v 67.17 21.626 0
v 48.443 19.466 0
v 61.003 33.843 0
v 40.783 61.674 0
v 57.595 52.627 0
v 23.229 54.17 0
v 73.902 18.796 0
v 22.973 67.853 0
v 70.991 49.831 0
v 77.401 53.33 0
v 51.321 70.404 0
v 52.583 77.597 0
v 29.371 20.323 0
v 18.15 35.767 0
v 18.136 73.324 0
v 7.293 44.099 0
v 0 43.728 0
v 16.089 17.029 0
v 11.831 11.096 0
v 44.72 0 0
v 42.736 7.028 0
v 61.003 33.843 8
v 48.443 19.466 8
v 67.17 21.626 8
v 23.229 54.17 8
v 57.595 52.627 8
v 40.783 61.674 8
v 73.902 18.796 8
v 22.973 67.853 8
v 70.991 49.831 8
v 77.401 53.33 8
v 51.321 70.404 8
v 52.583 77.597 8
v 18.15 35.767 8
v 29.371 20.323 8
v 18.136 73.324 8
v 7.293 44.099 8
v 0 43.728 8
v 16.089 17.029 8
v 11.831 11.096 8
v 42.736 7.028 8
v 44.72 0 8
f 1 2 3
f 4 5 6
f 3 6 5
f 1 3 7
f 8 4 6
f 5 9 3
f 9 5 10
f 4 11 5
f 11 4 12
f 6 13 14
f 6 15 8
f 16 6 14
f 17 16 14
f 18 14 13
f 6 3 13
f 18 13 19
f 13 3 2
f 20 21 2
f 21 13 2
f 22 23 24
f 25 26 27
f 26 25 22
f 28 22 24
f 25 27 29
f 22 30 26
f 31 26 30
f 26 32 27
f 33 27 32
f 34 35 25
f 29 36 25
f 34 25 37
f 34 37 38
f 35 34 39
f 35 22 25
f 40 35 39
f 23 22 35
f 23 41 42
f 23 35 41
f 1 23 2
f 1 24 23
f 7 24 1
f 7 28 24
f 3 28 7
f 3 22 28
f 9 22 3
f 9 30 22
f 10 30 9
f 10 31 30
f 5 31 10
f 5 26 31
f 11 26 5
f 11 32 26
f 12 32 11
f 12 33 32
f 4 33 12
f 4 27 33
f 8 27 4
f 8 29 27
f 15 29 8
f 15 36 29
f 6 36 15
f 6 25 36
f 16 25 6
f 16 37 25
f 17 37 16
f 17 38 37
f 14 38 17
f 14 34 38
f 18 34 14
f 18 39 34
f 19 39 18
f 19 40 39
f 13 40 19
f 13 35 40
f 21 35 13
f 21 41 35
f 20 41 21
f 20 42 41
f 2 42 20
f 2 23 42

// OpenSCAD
$fn = 32;

// ----------------------------------------------------------------------
// Fan rotor section: 7 blades, 22 mm hub radius, 18 mm blades
// ----------------------------------------------------------------------

// --- parameters (mm) ---
profile_height = 8;       // extrusion height
profile_points = 21;      // points of the closed outline

profile = [[61.003, 33.843], [70.991, 49.831], [77.401, 53.33], [57.595, 52.627], [51.321, 70.404], [52.583, 77.597], [40.783, 61.674], [22.973, 67.853], [18.136, 73.324], [23.229, 54.17], [7.293, 44.099], [0, 43.728], [18.15, 35.767], [16.089, 17.029], [11.831, 11.096], [29.371, 20.323], [42.736, 7.028], [44.72, 0], [48.443, 19.466], [67.17, 21.626], [73.902, 18.796]];  // single closed polygon, 21 points, counter clockwise

// --- the one profile operation ---
linear_extrude(height = profile_height) polygon(points = profile);
